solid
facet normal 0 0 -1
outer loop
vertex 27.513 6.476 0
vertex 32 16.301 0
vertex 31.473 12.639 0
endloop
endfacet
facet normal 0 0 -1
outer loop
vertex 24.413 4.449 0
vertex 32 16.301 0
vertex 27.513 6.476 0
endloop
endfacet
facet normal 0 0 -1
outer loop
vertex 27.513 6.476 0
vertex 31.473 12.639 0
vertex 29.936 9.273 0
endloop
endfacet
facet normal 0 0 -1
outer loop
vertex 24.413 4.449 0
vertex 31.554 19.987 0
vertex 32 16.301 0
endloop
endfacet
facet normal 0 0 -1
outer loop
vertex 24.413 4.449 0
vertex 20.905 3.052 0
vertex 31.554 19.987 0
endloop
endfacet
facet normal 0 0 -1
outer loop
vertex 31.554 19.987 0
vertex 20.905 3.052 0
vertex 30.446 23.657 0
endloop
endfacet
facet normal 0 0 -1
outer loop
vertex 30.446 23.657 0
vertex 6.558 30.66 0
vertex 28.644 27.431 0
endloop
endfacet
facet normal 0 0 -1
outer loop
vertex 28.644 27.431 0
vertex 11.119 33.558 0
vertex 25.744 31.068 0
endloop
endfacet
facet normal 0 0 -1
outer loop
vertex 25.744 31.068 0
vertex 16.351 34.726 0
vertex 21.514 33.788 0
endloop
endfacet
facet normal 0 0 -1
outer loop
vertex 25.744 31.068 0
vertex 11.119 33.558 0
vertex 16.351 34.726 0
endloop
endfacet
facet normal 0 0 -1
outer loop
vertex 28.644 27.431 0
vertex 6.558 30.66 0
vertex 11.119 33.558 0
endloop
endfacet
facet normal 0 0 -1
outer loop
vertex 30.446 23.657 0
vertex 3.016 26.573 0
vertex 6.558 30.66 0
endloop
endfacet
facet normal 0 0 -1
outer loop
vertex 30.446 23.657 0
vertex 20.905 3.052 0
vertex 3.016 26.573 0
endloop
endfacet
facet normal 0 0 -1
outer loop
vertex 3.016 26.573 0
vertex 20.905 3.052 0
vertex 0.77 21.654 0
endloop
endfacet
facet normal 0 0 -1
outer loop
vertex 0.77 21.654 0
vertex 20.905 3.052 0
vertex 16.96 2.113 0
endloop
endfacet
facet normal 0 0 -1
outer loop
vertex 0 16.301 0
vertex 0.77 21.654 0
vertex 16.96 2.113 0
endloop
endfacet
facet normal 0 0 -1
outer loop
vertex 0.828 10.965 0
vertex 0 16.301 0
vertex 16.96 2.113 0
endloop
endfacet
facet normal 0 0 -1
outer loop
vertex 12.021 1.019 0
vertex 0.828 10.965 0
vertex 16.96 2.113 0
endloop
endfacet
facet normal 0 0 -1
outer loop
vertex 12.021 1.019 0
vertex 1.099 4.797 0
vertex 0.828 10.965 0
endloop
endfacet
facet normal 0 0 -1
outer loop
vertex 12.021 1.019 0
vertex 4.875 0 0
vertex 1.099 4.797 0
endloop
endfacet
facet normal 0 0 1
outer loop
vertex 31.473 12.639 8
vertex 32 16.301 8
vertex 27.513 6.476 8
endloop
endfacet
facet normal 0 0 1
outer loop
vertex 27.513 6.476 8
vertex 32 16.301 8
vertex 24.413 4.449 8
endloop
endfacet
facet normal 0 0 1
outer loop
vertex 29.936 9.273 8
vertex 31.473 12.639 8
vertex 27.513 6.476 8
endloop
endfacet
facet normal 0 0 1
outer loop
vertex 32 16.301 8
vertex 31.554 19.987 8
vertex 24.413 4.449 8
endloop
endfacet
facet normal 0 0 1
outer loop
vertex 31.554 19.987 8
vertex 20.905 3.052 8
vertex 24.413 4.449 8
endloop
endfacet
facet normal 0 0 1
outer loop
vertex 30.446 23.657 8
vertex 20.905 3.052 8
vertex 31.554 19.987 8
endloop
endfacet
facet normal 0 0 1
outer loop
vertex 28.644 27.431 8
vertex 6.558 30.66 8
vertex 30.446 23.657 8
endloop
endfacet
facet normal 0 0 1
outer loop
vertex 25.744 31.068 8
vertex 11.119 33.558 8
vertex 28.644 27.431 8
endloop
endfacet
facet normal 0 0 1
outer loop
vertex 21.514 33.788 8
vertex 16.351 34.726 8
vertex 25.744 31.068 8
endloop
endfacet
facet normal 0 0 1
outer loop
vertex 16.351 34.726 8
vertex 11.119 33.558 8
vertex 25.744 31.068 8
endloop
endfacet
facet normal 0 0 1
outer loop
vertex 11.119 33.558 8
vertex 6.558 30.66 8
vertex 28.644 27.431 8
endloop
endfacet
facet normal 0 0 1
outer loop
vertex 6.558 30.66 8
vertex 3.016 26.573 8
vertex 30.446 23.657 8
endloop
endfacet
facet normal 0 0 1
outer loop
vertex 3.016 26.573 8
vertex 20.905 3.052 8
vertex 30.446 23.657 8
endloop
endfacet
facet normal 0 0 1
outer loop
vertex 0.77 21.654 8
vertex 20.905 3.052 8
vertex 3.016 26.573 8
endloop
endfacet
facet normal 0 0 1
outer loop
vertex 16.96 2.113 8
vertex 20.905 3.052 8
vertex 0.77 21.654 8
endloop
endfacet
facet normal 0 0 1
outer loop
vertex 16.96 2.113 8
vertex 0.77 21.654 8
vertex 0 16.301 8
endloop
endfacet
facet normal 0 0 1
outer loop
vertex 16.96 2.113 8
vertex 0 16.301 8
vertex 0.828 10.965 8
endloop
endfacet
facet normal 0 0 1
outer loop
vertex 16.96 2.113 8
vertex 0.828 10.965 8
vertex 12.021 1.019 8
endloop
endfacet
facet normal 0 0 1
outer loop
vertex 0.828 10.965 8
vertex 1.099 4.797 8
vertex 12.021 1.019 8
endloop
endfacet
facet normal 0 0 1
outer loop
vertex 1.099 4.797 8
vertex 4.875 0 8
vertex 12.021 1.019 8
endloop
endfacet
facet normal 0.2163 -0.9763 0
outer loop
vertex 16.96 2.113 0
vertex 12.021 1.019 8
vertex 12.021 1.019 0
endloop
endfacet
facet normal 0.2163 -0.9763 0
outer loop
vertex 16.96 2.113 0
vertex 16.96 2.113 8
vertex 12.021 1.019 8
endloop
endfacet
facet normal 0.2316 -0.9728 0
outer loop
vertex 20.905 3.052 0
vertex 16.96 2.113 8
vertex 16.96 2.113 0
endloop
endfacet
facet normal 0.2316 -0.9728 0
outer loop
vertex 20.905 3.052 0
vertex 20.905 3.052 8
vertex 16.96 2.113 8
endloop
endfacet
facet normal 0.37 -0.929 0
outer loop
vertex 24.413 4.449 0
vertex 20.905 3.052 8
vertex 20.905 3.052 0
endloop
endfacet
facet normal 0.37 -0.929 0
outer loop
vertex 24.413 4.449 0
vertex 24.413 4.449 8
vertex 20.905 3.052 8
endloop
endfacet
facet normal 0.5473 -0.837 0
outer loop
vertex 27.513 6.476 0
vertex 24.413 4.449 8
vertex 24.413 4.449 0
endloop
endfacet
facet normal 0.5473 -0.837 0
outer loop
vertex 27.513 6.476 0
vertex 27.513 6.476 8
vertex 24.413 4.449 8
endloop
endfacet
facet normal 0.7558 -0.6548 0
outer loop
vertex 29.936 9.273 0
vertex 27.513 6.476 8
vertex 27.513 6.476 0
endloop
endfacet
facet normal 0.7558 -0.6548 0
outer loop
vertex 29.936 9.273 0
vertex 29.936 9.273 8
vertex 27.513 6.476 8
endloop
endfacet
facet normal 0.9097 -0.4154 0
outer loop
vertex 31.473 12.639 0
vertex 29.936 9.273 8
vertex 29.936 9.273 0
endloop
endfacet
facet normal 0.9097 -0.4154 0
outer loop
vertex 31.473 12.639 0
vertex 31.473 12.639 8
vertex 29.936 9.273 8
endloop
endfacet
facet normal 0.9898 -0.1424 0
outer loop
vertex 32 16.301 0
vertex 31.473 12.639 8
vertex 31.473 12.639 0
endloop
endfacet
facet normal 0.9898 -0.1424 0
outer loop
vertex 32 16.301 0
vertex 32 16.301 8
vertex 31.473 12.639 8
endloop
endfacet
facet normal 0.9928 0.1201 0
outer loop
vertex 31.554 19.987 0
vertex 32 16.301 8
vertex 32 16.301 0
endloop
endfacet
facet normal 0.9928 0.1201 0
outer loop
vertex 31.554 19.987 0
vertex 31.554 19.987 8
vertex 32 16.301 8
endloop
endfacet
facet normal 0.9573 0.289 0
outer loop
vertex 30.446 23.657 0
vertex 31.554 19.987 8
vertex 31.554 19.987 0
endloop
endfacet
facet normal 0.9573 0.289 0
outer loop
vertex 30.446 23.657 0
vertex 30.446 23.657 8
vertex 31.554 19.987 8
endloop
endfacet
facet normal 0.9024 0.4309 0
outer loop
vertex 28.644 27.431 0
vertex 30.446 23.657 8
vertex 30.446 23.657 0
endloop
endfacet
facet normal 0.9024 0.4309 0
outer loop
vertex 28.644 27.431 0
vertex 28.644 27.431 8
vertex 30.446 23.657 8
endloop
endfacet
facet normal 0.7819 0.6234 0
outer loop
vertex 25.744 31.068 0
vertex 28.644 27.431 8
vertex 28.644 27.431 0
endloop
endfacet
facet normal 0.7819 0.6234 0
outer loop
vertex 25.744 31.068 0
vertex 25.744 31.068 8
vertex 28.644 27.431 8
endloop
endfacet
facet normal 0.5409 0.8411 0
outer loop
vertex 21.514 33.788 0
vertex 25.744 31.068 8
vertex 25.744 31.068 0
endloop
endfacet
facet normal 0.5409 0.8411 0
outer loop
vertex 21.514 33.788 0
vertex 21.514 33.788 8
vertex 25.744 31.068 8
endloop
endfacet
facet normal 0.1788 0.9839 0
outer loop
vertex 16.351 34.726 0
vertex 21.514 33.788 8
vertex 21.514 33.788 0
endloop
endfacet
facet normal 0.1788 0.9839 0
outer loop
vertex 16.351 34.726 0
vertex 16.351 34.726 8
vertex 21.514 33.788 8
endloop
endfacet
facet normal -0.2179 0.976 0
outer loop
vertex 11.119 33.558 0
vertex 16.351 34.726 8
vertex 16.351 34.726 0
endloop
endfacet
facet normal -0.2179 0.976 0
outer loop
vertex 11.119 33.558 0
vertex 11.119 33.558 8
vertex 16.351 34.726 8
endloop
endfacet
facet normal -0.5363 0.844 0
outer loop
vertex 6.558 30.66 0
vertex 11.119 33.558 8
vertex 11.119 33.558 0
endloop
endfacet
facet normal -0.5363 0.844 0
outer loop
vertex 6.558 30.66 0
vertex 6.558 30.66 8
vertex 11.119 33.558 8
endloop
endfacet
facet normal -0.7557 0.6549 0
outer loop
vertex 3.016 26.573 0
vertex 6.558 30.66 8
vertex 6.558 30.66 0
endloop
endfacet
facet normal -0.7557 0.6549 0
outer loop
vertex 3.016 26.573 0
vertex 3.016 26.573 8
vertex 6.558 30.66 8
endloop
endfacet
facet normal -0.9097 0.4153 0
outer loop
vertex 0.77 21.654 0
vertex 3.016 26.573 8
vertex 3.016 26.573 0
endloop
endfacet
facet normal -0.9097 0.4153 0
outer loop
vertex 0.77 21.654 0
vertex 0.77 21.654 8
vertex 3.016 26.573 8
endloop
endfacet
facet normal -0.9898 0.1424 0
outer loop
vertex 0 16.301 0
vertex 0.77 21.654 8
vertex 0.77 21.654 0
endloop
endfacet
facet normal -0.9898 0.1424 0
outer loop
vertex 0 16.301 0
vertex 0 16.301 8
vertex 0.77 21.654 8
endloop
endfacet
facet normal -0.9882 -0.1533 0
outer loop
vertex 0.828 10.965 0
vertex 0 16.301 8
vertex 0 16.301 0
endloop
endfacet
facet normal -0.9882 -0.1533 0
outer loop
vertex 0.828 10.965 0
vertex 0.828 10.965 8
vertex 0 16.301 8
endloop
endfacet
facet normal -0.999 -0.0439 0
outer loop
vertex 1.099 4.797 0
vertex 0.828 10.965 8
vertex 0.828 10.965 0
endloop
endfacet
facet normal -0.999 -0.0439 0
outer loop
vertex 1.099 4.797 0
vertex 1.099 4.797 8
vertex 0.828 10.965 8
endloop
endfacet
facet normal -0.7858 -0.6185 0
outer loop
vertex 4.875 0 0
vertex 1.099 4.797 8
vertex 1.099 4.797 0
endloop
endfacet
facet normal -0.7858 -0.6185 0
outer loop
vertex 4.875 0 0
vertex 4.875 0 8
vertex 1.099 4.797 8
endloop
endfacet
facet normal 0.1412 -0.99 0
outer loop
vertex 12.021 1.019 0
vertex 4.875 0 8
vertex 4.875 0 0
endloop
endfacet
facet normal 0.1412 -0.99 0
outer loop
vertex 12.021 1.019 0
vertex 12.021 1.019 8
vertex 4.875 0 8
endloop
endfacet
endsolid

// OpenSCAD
$fn = 32;

// ----------------------------------------------------------------------
// Cam disc: base radius 13.0 mm, lift 6.0 mm, 22 profile points
// ----------------------------------------------------------------------

// --- parameters (mm) ---
profile_height = 8;       // extrusion height
profile_points = 22;      // points of the closed outline

profile = [[32, 16.301], [31.554, 19.987], [30.446, 23.657], [28.644, 27.431], [25.744, 31.068], [21.514, 33.788], [16.351, 34.726], [11.119, 33.558], [6.558, 30.66], [3.016, 26.573], [0.77, 21.654], [0, 16.301], [0.828, 10.965], [1.099, 4.797], [4.875, 0], [12.021, 1.019], [16.96, 2.113], [20.905, 3.052], [24.413, 4.449], [27.513, 6.476], [29.936, 9.273], [31.473, 12.639]];  // single closed polygon, 22 points, counter clockwise

// --- the one profile operation ---
linear_extrude(height = profile_height) polygon(points = profile);
